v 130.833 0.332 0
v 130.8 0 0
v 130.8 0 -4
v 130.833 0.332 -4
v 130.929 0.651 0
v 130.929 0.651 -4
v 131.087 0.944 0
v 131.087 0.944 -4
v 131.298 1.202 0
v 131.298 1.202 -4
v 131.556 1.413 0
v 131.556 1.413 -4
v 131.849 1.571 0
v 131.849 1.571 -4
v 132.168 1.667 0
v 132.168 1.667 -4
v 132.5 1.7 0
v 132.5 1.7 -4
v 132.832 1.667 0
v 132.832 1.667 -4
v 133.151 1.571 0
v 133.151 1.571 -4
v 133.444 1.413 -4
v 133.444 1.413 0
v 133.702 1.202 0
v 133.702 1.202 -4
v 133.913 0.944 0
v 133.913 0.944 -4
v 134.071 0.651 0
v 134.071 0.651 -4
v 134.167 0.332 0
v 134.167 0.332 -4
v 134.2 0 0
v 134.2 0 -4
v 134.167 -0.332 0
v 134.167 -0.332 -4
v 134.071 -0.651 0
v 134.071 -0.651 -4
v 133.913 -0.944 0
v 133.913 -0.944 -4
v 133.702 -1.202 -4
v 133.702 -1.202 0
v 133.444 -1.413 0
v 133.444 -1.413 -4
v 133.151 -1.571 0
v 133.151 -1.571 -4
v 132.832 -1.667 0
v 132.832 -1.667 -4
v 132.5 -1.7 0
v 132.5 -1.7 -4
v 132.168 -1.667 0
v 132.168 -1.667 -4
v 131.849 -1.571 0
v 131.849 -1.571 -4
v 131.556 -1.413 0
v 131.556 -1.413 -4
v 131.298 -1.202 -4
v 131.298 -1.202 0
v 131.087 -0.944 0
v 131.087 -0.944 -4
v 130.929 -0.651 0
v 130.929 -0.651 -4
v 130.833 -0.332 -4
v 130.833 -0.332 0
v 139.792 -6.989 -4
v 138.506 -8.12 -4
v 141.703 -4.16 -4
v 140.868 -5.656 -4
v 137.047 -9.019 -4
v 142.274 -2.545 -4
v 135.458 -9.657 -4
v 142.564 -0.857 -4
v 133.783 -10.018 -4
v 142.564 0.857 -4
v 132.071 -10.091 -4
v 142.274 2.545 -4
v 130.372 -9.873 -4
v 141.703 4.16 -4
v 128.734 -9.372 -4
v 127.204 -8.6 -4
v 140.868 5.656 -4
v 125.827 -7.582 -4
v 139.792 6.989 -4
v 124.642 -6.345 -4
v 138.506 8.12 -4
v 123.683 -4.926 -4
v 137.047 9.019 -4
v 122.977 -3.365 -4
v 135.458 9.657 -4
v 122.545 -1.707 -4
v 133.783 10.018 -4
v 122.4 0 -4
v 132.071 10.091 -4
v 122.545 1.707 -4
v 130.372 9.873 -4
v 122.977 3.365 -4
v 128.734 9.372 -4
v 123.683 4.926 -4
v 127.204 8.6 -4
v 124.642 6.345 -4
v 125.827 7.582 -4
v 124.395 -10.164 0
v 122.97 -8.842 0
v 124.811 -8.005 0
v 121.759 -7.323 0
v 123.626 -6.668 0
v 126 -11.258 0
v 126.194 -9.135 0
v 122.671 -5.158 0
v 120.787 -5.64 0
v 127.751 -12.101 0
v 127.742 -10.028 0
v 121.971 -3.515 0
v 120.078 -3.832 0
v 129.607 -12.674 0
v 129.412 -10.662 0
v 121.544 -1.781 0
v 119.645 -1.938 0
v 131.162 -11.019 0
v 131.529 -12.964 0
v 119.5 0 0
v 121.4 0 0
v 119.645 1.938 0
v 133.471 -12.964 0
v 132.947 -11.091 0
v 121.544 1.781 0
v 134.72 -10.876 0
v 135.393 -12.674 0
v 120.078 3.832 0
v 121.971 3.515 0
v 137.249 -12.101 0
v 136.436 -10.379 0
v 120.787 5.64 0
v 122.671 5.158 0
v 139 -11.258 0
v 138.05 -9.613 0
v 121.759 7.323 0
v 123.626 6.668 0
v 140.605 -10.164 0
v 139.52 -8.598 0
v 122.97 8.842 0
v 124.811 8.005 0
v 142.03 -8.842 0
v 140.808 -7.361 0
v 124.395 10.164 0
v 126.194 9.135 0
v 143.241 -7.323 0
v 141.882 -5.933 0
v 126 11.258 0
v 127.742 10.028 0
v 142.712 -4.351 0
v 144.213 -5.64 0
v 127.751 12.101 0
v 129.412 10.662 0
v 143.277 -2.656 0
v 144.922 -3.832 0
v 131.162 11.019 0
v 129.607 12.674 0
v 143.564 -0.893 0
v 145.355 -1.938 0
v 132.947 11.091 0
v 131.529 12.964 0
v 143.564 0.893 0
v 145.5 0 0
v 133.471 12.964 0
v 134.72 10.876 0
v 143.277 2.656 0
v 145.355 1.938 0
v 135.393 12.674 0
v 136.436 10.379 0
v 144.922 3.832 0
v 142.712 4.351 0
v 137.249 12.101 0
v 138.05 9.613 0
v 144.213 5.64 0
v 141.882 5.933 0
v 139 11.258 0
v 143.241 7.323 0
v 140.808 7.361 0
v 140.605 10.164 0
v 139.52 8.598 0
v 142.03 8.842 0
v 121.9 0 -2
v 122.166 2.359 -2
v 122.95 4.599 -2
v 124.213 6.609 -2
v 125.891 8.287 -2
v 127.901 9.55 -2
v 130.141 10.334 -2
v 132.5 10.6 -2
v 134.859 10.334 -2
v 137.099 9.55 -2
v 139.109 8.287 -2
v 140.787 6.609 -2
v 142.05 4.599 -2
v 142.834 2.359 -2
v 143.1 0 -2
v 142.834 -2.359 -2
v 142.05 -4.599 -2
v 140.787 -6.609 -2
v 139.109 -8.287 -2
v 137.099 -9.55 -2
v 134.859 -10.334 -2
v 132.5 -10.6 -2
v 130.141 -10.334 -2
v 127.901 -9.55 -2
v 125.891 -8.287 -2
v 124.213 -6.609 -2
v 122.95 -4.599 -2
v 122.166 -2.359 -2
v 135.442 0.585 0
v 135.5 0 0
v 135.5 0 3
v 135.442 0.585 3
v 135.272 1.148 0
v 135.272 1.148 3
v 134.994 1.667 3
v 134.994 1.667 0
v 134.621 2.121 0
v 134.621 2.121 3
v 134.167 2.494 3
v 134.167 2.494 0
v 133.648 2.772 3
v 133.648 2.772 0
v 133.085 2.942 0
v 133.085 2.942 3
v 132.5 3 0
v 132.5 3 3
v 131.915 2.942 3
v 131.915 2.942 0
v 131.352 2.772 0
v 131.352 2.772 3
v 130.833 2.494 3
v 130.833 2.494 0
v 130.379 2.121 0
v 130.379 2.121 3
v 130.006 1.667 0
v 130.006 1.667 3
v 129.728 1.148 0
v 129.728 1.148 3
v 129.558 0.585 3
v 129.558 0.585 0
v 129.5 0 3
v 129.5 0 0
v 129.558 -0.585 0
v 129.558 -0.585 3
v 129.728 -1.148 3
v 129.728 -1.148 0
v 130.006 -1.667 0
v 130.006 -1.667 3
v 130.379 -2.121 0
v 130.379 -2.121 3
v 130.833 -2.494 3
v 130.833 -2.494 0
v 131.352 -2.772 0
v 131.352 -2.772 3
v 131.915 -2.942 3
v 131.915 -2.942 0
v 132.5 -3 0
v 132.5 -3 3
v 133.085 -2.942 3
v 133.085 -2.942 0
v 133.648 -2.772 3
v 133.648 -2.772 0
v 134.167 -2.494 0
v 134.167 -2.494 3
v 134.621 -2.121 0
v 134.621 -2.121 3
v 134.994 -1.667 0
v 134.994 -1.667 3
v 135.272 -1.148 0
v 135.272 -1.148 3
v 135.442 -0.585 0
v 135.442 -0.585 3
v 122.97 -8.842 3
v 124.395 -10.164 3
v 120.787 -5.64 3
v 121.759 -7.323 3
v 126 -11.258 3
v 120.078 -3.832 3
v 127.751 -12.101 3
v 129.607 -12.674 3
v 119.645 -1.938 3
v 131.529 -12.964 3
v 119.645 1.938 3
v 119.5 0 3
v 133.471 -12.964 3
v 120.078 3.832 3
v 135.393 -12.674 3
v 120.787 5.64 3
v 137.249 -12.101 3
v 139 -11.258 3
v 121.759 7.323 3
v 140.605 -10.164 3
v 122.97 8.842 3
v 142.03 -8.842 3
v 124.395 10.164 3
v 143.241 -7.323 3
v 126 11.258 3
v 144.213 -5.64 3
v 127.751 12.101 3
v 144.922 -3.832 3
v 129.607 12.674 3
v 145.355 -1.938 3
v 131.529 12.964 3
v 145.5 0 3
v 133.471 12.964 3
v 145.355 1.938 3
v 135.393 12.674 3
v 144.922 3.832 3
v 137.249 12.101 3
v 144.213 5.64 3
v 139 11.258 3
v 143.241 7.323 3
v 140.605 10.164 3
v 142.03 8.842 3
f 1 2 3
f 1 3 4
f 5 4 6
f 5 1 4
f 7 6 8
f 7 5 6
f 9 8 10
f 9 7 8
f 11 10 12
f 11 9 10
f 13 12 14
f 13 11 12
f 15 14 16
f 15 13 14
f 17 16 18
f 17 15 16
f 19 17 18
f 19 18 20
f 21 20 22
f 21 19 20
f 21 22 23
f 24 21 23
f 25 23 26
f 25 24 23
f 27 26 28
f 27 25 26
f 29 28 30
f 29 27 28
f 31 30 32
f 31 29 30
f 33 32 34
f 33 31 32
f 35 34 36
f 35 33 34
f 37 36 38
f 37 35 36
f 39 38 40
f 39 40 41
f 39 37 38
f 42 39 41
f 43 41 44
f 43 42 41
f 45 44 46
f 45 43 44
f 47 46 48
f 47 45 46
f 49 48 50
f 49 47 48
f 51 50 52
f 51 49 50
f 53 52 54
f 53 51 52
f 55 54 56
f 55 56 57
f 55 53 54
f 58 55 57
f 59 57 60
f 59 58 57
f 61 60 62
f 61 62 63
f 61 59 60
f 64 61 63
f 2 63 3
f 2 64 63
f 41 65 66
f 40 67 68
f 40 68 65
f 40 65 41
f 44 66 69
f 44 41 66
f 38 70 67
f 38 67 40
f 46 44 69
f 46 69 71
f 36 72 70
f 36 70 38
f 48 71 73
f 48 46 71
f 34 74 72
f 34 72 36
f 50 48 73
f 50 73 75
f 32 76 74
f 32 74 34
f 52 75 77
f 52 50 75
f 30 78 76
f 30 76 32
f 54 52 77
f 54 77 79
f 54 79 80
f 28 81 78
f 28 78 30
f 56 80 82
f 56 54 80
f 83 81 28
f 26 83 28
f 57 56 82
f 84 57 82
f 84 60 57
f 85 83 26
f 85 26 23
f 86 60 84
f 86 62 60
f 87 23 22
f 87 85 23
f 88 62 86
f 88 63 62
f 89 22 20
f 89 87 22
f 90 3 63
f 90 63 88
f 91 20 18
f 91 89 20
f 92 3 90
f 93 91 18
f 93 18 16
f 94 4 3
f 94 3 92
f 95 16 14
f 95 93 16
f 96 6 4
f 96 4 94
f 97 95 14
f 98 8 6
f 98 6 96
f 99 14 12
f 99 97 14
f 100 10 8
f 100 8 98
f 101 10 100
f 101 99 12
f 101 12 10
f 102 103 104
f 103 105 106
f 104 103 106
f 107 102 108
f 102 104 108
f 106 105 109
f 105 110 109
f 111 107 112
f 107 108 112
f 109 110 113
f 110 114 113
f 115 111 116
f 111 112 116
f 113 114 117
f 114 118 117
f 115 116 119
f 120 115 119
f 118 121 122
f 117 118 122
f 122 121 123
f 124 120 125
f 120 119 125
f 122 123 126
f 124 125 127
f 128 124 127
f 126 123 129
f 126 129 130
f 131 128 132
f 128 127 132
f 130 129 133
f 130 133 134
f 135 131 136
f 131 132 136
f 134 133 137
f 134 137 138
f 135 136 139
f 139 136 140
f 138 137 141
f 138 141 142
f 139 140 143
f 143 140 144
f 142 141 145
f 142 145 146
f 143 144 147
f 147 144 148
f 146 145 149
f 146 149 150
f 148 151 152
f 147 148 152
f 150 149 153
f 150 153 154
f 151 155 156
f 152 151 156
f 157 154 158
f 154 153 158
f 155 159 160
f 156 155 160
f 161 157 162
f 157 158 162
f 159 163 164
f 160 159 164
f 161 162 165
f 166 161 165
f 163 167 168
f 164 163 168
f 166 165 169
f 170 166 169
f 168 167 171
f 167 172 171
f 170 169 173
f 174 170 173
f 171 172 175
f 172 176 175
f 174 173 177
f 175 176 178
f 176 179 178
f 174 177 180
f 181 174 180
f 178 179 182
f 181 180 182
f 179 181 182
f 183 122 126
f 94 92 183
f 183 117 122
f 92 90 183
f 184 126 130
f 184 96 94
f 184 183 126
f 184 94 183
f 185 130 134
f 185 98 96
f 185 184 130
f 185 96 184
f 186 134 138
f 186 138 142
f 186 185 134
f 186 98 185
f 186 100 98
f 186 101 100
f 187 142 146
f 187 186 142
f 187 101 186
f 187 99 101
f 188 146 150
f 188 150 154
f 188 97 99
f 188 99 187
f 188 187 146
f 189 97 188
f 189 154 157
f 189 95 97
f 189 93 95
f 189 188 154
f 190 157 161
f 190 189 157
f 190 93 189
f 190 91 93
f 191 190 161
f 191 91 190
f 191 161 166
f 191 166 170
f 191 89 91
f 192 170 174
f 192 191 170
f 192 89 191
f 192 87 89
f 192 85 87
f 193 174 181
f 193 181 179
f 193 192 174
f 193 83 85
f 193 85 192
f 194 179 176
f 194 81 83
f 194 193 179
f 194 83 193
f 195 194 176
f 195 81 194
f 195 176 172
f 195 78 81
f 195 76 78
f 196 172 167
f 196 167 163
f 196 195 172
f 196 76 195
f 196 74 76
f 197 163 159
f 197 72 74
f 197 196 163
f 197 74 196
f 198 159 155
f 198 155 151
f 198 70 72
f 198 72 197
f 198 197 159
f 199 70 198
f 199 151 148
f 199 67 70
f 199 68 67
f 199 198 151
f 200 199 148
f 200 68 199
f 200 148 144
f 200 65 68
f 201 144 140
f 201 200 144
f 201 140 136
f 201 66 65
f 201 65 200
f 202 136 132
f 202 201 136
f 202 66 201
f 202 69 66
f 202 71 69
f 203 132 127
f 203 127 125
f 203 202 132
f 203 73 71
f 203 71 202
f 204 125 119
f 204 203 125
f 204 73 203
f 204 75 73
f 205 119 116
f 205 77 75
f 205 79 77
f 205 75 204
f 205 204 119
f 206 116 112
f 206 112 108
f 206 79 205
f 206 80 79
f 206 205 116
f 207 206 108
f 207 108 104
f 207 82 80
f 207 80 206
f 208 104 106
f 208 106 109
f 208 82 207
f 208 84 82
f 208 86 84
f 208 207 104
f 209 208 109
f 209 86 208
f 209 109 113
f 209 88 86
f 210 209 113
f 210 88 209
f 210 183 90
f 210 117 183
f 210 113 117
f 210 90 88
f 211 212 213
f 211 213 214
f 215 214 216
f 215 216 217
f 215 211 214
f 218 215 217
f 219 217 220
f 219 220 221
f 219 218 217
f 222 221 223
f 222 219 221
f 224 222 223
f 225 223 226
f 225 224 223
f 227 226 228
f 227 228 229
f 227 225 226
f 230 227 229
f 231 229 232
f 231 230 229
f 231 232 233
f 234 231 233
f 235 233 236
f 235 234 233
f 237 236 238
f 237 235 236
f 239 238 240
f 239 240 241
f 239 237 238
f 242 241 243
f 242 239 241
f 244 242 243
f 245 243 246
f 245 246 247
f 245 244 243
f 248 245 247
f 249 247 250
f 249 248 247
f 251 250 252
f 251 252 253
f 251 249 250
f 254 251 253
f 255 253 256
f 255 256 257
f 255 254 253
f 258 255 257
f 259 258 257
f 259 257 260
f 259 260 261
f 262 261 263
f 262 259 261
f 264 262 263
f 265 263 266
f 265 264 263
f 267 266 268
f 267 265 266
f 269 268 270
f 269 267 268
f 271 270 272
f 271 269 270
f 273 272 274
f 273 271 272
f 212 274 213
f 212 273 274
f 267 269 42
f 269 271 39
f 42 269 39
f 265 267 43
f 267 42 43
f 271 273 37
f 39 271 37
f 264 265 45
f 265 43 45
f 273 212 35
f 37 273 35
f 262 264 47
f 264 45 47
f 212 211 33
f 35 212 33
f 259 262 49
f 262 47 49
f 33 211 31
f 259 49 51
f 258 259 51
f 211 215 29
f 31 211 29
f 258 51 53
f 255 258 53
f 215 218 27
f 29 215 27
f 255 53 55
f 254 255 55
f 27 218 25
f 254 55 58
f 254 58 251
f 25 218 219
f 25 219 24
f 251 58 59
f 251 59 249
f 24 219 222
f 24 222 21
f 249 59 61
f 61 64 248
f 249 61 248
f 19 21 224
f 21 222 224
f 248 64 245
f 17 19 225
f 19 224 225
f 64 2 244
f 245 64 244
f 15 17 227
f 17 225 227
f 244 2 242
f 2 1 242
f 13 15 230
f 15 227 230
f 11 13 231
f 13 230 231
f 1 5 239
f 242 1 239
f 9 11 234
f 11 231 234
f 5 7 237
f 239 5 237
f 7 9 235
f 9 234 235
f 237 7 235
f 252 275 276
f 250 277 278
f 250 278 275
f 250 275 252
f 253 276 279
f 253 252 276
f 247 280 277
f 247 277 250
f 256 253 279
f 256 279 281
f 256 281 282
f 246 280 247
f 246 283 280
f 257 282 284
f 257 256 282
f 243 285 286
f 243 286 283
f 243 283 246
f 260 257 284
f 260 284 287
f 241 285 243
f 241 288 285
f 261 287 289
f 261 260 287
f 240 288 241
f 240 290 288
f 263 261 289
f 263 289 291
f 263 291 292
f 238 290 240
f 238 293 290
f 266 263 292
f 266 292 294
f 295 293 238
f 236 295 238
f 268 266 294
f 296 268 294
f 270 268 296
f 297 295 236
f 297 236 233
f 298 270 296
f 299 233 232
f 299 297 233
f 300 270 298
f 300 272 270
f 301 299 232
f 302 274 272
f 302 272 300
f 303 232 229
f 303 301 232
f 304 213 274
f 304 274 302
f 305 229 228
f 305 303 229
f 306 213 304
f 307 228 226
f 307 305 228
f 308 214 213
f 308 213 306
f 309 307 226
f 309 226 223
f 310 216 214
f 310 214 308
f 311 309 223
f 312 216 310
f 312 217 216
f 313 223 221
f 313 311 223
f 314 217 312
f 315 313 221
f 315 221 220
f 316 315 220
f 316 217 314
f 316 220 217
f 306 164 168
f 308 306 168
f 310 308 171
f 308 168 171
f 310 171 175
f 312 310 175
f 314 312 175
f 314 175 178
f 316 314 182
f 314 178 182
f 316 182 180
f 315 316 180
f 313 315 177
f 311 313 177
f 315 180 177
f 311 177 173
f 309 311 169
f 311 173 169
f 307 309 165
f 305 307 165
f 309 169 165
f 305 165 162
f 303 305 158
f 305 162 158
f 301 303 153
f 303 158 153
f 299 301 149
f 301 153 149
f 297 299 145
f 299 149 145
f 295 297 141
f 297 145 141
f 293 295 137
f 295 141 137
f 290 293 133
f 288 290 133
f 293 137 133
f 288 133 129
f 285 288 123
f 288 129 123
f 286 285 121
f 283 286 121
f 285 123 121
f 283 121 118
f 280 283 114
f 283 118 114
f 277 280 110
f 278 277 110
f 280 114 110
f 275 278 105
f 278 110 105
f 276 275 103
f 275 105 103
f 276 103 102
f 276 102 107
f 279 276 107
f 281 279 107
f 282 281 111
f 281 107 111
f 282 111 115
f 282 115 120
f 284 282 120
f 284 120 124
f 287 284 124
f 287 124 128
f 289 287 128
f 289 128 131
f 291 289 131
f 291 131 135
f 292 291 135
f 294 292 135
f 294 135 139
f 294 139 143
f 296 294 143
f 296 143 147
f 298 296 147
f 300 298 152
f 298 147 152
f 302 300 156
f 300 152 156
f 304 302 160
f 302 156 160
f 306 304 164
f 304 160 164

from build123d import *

# Parameters (mm, degrees)
SKETCH1_R           = 13
SKETCH1_R_2         = 3
BOSS_EXTRUDE1_DEPTH = 3
SKETCH2_R           = 11.1
SKETCH2_R_2         = 1.7
BOSS_EXTRUDE2_DEPTH = 4
CHAMFER1_SIZE       = 4
CHAMFER1_SIZE_2     = 1


with BuildPart() as part:
    # Sketch1 → Boss-Extrude1 (new body)
    with BuildSketch(Plane.XY):
        with Locations((132.499999994, -1e-09)):
            Circle(SKETCH1_R)
        with Locations((132.499999994, -1e-09)):
            Circle(SKETCH1_R_2, mode=Mode.SUBTRACT)
    extrude(amount=BOSS_EXTRUDE1_DEPTH)

    # Sketch2 → Boss-Extrude2 (add)
    with BuildSketch(Plane(origin=(0, 0, 0), x_dir=(-1, 0, 0), z_dir=(0, 0, -1))):
        with Locations((-132.5, 0)):
            Circle(SKETCH2_R)
        with Locations((-132.5, 0)):
            Circle(SKETCH2_R_2, mode=Mode.SUBTRACT)
    extrude(amount=BOSS_EXTRUDE2_DEPTH)

    # Chamfer1
    # the kernel refuses this chamfer: 4, 1 mm, written as the material it takes off along each edge
    with BuildSketch(Plane(origin=(132.5, 0, -4), x_dir=(-1, 0, 0), z_dir=(0, -1, 0))) as chamfer1_piece_1_section:
        Polygon((11.1, -CHAMFER1_SIZE), (11.1 - CHAMFER1_SIZE_2, 0), (11.1, 0), align=None)
    chamfer1_piece_1 = revolve(axis=Axis((132.5, 0, -4), (0, 0, -1)), mode=Mode.PRIVATE)
    chamfer1_piece_1 = split(chamfer1_piece_1, bisect_by=Plane(origin=(132.5, 0, 0), z_dir=(0, 0, -1)), keep=Keep.TOP, mode=Mode.PRIVATE)
    add(chamfer1_piece_1, mode=Mode.SUBTRACT)


solid = part.part
